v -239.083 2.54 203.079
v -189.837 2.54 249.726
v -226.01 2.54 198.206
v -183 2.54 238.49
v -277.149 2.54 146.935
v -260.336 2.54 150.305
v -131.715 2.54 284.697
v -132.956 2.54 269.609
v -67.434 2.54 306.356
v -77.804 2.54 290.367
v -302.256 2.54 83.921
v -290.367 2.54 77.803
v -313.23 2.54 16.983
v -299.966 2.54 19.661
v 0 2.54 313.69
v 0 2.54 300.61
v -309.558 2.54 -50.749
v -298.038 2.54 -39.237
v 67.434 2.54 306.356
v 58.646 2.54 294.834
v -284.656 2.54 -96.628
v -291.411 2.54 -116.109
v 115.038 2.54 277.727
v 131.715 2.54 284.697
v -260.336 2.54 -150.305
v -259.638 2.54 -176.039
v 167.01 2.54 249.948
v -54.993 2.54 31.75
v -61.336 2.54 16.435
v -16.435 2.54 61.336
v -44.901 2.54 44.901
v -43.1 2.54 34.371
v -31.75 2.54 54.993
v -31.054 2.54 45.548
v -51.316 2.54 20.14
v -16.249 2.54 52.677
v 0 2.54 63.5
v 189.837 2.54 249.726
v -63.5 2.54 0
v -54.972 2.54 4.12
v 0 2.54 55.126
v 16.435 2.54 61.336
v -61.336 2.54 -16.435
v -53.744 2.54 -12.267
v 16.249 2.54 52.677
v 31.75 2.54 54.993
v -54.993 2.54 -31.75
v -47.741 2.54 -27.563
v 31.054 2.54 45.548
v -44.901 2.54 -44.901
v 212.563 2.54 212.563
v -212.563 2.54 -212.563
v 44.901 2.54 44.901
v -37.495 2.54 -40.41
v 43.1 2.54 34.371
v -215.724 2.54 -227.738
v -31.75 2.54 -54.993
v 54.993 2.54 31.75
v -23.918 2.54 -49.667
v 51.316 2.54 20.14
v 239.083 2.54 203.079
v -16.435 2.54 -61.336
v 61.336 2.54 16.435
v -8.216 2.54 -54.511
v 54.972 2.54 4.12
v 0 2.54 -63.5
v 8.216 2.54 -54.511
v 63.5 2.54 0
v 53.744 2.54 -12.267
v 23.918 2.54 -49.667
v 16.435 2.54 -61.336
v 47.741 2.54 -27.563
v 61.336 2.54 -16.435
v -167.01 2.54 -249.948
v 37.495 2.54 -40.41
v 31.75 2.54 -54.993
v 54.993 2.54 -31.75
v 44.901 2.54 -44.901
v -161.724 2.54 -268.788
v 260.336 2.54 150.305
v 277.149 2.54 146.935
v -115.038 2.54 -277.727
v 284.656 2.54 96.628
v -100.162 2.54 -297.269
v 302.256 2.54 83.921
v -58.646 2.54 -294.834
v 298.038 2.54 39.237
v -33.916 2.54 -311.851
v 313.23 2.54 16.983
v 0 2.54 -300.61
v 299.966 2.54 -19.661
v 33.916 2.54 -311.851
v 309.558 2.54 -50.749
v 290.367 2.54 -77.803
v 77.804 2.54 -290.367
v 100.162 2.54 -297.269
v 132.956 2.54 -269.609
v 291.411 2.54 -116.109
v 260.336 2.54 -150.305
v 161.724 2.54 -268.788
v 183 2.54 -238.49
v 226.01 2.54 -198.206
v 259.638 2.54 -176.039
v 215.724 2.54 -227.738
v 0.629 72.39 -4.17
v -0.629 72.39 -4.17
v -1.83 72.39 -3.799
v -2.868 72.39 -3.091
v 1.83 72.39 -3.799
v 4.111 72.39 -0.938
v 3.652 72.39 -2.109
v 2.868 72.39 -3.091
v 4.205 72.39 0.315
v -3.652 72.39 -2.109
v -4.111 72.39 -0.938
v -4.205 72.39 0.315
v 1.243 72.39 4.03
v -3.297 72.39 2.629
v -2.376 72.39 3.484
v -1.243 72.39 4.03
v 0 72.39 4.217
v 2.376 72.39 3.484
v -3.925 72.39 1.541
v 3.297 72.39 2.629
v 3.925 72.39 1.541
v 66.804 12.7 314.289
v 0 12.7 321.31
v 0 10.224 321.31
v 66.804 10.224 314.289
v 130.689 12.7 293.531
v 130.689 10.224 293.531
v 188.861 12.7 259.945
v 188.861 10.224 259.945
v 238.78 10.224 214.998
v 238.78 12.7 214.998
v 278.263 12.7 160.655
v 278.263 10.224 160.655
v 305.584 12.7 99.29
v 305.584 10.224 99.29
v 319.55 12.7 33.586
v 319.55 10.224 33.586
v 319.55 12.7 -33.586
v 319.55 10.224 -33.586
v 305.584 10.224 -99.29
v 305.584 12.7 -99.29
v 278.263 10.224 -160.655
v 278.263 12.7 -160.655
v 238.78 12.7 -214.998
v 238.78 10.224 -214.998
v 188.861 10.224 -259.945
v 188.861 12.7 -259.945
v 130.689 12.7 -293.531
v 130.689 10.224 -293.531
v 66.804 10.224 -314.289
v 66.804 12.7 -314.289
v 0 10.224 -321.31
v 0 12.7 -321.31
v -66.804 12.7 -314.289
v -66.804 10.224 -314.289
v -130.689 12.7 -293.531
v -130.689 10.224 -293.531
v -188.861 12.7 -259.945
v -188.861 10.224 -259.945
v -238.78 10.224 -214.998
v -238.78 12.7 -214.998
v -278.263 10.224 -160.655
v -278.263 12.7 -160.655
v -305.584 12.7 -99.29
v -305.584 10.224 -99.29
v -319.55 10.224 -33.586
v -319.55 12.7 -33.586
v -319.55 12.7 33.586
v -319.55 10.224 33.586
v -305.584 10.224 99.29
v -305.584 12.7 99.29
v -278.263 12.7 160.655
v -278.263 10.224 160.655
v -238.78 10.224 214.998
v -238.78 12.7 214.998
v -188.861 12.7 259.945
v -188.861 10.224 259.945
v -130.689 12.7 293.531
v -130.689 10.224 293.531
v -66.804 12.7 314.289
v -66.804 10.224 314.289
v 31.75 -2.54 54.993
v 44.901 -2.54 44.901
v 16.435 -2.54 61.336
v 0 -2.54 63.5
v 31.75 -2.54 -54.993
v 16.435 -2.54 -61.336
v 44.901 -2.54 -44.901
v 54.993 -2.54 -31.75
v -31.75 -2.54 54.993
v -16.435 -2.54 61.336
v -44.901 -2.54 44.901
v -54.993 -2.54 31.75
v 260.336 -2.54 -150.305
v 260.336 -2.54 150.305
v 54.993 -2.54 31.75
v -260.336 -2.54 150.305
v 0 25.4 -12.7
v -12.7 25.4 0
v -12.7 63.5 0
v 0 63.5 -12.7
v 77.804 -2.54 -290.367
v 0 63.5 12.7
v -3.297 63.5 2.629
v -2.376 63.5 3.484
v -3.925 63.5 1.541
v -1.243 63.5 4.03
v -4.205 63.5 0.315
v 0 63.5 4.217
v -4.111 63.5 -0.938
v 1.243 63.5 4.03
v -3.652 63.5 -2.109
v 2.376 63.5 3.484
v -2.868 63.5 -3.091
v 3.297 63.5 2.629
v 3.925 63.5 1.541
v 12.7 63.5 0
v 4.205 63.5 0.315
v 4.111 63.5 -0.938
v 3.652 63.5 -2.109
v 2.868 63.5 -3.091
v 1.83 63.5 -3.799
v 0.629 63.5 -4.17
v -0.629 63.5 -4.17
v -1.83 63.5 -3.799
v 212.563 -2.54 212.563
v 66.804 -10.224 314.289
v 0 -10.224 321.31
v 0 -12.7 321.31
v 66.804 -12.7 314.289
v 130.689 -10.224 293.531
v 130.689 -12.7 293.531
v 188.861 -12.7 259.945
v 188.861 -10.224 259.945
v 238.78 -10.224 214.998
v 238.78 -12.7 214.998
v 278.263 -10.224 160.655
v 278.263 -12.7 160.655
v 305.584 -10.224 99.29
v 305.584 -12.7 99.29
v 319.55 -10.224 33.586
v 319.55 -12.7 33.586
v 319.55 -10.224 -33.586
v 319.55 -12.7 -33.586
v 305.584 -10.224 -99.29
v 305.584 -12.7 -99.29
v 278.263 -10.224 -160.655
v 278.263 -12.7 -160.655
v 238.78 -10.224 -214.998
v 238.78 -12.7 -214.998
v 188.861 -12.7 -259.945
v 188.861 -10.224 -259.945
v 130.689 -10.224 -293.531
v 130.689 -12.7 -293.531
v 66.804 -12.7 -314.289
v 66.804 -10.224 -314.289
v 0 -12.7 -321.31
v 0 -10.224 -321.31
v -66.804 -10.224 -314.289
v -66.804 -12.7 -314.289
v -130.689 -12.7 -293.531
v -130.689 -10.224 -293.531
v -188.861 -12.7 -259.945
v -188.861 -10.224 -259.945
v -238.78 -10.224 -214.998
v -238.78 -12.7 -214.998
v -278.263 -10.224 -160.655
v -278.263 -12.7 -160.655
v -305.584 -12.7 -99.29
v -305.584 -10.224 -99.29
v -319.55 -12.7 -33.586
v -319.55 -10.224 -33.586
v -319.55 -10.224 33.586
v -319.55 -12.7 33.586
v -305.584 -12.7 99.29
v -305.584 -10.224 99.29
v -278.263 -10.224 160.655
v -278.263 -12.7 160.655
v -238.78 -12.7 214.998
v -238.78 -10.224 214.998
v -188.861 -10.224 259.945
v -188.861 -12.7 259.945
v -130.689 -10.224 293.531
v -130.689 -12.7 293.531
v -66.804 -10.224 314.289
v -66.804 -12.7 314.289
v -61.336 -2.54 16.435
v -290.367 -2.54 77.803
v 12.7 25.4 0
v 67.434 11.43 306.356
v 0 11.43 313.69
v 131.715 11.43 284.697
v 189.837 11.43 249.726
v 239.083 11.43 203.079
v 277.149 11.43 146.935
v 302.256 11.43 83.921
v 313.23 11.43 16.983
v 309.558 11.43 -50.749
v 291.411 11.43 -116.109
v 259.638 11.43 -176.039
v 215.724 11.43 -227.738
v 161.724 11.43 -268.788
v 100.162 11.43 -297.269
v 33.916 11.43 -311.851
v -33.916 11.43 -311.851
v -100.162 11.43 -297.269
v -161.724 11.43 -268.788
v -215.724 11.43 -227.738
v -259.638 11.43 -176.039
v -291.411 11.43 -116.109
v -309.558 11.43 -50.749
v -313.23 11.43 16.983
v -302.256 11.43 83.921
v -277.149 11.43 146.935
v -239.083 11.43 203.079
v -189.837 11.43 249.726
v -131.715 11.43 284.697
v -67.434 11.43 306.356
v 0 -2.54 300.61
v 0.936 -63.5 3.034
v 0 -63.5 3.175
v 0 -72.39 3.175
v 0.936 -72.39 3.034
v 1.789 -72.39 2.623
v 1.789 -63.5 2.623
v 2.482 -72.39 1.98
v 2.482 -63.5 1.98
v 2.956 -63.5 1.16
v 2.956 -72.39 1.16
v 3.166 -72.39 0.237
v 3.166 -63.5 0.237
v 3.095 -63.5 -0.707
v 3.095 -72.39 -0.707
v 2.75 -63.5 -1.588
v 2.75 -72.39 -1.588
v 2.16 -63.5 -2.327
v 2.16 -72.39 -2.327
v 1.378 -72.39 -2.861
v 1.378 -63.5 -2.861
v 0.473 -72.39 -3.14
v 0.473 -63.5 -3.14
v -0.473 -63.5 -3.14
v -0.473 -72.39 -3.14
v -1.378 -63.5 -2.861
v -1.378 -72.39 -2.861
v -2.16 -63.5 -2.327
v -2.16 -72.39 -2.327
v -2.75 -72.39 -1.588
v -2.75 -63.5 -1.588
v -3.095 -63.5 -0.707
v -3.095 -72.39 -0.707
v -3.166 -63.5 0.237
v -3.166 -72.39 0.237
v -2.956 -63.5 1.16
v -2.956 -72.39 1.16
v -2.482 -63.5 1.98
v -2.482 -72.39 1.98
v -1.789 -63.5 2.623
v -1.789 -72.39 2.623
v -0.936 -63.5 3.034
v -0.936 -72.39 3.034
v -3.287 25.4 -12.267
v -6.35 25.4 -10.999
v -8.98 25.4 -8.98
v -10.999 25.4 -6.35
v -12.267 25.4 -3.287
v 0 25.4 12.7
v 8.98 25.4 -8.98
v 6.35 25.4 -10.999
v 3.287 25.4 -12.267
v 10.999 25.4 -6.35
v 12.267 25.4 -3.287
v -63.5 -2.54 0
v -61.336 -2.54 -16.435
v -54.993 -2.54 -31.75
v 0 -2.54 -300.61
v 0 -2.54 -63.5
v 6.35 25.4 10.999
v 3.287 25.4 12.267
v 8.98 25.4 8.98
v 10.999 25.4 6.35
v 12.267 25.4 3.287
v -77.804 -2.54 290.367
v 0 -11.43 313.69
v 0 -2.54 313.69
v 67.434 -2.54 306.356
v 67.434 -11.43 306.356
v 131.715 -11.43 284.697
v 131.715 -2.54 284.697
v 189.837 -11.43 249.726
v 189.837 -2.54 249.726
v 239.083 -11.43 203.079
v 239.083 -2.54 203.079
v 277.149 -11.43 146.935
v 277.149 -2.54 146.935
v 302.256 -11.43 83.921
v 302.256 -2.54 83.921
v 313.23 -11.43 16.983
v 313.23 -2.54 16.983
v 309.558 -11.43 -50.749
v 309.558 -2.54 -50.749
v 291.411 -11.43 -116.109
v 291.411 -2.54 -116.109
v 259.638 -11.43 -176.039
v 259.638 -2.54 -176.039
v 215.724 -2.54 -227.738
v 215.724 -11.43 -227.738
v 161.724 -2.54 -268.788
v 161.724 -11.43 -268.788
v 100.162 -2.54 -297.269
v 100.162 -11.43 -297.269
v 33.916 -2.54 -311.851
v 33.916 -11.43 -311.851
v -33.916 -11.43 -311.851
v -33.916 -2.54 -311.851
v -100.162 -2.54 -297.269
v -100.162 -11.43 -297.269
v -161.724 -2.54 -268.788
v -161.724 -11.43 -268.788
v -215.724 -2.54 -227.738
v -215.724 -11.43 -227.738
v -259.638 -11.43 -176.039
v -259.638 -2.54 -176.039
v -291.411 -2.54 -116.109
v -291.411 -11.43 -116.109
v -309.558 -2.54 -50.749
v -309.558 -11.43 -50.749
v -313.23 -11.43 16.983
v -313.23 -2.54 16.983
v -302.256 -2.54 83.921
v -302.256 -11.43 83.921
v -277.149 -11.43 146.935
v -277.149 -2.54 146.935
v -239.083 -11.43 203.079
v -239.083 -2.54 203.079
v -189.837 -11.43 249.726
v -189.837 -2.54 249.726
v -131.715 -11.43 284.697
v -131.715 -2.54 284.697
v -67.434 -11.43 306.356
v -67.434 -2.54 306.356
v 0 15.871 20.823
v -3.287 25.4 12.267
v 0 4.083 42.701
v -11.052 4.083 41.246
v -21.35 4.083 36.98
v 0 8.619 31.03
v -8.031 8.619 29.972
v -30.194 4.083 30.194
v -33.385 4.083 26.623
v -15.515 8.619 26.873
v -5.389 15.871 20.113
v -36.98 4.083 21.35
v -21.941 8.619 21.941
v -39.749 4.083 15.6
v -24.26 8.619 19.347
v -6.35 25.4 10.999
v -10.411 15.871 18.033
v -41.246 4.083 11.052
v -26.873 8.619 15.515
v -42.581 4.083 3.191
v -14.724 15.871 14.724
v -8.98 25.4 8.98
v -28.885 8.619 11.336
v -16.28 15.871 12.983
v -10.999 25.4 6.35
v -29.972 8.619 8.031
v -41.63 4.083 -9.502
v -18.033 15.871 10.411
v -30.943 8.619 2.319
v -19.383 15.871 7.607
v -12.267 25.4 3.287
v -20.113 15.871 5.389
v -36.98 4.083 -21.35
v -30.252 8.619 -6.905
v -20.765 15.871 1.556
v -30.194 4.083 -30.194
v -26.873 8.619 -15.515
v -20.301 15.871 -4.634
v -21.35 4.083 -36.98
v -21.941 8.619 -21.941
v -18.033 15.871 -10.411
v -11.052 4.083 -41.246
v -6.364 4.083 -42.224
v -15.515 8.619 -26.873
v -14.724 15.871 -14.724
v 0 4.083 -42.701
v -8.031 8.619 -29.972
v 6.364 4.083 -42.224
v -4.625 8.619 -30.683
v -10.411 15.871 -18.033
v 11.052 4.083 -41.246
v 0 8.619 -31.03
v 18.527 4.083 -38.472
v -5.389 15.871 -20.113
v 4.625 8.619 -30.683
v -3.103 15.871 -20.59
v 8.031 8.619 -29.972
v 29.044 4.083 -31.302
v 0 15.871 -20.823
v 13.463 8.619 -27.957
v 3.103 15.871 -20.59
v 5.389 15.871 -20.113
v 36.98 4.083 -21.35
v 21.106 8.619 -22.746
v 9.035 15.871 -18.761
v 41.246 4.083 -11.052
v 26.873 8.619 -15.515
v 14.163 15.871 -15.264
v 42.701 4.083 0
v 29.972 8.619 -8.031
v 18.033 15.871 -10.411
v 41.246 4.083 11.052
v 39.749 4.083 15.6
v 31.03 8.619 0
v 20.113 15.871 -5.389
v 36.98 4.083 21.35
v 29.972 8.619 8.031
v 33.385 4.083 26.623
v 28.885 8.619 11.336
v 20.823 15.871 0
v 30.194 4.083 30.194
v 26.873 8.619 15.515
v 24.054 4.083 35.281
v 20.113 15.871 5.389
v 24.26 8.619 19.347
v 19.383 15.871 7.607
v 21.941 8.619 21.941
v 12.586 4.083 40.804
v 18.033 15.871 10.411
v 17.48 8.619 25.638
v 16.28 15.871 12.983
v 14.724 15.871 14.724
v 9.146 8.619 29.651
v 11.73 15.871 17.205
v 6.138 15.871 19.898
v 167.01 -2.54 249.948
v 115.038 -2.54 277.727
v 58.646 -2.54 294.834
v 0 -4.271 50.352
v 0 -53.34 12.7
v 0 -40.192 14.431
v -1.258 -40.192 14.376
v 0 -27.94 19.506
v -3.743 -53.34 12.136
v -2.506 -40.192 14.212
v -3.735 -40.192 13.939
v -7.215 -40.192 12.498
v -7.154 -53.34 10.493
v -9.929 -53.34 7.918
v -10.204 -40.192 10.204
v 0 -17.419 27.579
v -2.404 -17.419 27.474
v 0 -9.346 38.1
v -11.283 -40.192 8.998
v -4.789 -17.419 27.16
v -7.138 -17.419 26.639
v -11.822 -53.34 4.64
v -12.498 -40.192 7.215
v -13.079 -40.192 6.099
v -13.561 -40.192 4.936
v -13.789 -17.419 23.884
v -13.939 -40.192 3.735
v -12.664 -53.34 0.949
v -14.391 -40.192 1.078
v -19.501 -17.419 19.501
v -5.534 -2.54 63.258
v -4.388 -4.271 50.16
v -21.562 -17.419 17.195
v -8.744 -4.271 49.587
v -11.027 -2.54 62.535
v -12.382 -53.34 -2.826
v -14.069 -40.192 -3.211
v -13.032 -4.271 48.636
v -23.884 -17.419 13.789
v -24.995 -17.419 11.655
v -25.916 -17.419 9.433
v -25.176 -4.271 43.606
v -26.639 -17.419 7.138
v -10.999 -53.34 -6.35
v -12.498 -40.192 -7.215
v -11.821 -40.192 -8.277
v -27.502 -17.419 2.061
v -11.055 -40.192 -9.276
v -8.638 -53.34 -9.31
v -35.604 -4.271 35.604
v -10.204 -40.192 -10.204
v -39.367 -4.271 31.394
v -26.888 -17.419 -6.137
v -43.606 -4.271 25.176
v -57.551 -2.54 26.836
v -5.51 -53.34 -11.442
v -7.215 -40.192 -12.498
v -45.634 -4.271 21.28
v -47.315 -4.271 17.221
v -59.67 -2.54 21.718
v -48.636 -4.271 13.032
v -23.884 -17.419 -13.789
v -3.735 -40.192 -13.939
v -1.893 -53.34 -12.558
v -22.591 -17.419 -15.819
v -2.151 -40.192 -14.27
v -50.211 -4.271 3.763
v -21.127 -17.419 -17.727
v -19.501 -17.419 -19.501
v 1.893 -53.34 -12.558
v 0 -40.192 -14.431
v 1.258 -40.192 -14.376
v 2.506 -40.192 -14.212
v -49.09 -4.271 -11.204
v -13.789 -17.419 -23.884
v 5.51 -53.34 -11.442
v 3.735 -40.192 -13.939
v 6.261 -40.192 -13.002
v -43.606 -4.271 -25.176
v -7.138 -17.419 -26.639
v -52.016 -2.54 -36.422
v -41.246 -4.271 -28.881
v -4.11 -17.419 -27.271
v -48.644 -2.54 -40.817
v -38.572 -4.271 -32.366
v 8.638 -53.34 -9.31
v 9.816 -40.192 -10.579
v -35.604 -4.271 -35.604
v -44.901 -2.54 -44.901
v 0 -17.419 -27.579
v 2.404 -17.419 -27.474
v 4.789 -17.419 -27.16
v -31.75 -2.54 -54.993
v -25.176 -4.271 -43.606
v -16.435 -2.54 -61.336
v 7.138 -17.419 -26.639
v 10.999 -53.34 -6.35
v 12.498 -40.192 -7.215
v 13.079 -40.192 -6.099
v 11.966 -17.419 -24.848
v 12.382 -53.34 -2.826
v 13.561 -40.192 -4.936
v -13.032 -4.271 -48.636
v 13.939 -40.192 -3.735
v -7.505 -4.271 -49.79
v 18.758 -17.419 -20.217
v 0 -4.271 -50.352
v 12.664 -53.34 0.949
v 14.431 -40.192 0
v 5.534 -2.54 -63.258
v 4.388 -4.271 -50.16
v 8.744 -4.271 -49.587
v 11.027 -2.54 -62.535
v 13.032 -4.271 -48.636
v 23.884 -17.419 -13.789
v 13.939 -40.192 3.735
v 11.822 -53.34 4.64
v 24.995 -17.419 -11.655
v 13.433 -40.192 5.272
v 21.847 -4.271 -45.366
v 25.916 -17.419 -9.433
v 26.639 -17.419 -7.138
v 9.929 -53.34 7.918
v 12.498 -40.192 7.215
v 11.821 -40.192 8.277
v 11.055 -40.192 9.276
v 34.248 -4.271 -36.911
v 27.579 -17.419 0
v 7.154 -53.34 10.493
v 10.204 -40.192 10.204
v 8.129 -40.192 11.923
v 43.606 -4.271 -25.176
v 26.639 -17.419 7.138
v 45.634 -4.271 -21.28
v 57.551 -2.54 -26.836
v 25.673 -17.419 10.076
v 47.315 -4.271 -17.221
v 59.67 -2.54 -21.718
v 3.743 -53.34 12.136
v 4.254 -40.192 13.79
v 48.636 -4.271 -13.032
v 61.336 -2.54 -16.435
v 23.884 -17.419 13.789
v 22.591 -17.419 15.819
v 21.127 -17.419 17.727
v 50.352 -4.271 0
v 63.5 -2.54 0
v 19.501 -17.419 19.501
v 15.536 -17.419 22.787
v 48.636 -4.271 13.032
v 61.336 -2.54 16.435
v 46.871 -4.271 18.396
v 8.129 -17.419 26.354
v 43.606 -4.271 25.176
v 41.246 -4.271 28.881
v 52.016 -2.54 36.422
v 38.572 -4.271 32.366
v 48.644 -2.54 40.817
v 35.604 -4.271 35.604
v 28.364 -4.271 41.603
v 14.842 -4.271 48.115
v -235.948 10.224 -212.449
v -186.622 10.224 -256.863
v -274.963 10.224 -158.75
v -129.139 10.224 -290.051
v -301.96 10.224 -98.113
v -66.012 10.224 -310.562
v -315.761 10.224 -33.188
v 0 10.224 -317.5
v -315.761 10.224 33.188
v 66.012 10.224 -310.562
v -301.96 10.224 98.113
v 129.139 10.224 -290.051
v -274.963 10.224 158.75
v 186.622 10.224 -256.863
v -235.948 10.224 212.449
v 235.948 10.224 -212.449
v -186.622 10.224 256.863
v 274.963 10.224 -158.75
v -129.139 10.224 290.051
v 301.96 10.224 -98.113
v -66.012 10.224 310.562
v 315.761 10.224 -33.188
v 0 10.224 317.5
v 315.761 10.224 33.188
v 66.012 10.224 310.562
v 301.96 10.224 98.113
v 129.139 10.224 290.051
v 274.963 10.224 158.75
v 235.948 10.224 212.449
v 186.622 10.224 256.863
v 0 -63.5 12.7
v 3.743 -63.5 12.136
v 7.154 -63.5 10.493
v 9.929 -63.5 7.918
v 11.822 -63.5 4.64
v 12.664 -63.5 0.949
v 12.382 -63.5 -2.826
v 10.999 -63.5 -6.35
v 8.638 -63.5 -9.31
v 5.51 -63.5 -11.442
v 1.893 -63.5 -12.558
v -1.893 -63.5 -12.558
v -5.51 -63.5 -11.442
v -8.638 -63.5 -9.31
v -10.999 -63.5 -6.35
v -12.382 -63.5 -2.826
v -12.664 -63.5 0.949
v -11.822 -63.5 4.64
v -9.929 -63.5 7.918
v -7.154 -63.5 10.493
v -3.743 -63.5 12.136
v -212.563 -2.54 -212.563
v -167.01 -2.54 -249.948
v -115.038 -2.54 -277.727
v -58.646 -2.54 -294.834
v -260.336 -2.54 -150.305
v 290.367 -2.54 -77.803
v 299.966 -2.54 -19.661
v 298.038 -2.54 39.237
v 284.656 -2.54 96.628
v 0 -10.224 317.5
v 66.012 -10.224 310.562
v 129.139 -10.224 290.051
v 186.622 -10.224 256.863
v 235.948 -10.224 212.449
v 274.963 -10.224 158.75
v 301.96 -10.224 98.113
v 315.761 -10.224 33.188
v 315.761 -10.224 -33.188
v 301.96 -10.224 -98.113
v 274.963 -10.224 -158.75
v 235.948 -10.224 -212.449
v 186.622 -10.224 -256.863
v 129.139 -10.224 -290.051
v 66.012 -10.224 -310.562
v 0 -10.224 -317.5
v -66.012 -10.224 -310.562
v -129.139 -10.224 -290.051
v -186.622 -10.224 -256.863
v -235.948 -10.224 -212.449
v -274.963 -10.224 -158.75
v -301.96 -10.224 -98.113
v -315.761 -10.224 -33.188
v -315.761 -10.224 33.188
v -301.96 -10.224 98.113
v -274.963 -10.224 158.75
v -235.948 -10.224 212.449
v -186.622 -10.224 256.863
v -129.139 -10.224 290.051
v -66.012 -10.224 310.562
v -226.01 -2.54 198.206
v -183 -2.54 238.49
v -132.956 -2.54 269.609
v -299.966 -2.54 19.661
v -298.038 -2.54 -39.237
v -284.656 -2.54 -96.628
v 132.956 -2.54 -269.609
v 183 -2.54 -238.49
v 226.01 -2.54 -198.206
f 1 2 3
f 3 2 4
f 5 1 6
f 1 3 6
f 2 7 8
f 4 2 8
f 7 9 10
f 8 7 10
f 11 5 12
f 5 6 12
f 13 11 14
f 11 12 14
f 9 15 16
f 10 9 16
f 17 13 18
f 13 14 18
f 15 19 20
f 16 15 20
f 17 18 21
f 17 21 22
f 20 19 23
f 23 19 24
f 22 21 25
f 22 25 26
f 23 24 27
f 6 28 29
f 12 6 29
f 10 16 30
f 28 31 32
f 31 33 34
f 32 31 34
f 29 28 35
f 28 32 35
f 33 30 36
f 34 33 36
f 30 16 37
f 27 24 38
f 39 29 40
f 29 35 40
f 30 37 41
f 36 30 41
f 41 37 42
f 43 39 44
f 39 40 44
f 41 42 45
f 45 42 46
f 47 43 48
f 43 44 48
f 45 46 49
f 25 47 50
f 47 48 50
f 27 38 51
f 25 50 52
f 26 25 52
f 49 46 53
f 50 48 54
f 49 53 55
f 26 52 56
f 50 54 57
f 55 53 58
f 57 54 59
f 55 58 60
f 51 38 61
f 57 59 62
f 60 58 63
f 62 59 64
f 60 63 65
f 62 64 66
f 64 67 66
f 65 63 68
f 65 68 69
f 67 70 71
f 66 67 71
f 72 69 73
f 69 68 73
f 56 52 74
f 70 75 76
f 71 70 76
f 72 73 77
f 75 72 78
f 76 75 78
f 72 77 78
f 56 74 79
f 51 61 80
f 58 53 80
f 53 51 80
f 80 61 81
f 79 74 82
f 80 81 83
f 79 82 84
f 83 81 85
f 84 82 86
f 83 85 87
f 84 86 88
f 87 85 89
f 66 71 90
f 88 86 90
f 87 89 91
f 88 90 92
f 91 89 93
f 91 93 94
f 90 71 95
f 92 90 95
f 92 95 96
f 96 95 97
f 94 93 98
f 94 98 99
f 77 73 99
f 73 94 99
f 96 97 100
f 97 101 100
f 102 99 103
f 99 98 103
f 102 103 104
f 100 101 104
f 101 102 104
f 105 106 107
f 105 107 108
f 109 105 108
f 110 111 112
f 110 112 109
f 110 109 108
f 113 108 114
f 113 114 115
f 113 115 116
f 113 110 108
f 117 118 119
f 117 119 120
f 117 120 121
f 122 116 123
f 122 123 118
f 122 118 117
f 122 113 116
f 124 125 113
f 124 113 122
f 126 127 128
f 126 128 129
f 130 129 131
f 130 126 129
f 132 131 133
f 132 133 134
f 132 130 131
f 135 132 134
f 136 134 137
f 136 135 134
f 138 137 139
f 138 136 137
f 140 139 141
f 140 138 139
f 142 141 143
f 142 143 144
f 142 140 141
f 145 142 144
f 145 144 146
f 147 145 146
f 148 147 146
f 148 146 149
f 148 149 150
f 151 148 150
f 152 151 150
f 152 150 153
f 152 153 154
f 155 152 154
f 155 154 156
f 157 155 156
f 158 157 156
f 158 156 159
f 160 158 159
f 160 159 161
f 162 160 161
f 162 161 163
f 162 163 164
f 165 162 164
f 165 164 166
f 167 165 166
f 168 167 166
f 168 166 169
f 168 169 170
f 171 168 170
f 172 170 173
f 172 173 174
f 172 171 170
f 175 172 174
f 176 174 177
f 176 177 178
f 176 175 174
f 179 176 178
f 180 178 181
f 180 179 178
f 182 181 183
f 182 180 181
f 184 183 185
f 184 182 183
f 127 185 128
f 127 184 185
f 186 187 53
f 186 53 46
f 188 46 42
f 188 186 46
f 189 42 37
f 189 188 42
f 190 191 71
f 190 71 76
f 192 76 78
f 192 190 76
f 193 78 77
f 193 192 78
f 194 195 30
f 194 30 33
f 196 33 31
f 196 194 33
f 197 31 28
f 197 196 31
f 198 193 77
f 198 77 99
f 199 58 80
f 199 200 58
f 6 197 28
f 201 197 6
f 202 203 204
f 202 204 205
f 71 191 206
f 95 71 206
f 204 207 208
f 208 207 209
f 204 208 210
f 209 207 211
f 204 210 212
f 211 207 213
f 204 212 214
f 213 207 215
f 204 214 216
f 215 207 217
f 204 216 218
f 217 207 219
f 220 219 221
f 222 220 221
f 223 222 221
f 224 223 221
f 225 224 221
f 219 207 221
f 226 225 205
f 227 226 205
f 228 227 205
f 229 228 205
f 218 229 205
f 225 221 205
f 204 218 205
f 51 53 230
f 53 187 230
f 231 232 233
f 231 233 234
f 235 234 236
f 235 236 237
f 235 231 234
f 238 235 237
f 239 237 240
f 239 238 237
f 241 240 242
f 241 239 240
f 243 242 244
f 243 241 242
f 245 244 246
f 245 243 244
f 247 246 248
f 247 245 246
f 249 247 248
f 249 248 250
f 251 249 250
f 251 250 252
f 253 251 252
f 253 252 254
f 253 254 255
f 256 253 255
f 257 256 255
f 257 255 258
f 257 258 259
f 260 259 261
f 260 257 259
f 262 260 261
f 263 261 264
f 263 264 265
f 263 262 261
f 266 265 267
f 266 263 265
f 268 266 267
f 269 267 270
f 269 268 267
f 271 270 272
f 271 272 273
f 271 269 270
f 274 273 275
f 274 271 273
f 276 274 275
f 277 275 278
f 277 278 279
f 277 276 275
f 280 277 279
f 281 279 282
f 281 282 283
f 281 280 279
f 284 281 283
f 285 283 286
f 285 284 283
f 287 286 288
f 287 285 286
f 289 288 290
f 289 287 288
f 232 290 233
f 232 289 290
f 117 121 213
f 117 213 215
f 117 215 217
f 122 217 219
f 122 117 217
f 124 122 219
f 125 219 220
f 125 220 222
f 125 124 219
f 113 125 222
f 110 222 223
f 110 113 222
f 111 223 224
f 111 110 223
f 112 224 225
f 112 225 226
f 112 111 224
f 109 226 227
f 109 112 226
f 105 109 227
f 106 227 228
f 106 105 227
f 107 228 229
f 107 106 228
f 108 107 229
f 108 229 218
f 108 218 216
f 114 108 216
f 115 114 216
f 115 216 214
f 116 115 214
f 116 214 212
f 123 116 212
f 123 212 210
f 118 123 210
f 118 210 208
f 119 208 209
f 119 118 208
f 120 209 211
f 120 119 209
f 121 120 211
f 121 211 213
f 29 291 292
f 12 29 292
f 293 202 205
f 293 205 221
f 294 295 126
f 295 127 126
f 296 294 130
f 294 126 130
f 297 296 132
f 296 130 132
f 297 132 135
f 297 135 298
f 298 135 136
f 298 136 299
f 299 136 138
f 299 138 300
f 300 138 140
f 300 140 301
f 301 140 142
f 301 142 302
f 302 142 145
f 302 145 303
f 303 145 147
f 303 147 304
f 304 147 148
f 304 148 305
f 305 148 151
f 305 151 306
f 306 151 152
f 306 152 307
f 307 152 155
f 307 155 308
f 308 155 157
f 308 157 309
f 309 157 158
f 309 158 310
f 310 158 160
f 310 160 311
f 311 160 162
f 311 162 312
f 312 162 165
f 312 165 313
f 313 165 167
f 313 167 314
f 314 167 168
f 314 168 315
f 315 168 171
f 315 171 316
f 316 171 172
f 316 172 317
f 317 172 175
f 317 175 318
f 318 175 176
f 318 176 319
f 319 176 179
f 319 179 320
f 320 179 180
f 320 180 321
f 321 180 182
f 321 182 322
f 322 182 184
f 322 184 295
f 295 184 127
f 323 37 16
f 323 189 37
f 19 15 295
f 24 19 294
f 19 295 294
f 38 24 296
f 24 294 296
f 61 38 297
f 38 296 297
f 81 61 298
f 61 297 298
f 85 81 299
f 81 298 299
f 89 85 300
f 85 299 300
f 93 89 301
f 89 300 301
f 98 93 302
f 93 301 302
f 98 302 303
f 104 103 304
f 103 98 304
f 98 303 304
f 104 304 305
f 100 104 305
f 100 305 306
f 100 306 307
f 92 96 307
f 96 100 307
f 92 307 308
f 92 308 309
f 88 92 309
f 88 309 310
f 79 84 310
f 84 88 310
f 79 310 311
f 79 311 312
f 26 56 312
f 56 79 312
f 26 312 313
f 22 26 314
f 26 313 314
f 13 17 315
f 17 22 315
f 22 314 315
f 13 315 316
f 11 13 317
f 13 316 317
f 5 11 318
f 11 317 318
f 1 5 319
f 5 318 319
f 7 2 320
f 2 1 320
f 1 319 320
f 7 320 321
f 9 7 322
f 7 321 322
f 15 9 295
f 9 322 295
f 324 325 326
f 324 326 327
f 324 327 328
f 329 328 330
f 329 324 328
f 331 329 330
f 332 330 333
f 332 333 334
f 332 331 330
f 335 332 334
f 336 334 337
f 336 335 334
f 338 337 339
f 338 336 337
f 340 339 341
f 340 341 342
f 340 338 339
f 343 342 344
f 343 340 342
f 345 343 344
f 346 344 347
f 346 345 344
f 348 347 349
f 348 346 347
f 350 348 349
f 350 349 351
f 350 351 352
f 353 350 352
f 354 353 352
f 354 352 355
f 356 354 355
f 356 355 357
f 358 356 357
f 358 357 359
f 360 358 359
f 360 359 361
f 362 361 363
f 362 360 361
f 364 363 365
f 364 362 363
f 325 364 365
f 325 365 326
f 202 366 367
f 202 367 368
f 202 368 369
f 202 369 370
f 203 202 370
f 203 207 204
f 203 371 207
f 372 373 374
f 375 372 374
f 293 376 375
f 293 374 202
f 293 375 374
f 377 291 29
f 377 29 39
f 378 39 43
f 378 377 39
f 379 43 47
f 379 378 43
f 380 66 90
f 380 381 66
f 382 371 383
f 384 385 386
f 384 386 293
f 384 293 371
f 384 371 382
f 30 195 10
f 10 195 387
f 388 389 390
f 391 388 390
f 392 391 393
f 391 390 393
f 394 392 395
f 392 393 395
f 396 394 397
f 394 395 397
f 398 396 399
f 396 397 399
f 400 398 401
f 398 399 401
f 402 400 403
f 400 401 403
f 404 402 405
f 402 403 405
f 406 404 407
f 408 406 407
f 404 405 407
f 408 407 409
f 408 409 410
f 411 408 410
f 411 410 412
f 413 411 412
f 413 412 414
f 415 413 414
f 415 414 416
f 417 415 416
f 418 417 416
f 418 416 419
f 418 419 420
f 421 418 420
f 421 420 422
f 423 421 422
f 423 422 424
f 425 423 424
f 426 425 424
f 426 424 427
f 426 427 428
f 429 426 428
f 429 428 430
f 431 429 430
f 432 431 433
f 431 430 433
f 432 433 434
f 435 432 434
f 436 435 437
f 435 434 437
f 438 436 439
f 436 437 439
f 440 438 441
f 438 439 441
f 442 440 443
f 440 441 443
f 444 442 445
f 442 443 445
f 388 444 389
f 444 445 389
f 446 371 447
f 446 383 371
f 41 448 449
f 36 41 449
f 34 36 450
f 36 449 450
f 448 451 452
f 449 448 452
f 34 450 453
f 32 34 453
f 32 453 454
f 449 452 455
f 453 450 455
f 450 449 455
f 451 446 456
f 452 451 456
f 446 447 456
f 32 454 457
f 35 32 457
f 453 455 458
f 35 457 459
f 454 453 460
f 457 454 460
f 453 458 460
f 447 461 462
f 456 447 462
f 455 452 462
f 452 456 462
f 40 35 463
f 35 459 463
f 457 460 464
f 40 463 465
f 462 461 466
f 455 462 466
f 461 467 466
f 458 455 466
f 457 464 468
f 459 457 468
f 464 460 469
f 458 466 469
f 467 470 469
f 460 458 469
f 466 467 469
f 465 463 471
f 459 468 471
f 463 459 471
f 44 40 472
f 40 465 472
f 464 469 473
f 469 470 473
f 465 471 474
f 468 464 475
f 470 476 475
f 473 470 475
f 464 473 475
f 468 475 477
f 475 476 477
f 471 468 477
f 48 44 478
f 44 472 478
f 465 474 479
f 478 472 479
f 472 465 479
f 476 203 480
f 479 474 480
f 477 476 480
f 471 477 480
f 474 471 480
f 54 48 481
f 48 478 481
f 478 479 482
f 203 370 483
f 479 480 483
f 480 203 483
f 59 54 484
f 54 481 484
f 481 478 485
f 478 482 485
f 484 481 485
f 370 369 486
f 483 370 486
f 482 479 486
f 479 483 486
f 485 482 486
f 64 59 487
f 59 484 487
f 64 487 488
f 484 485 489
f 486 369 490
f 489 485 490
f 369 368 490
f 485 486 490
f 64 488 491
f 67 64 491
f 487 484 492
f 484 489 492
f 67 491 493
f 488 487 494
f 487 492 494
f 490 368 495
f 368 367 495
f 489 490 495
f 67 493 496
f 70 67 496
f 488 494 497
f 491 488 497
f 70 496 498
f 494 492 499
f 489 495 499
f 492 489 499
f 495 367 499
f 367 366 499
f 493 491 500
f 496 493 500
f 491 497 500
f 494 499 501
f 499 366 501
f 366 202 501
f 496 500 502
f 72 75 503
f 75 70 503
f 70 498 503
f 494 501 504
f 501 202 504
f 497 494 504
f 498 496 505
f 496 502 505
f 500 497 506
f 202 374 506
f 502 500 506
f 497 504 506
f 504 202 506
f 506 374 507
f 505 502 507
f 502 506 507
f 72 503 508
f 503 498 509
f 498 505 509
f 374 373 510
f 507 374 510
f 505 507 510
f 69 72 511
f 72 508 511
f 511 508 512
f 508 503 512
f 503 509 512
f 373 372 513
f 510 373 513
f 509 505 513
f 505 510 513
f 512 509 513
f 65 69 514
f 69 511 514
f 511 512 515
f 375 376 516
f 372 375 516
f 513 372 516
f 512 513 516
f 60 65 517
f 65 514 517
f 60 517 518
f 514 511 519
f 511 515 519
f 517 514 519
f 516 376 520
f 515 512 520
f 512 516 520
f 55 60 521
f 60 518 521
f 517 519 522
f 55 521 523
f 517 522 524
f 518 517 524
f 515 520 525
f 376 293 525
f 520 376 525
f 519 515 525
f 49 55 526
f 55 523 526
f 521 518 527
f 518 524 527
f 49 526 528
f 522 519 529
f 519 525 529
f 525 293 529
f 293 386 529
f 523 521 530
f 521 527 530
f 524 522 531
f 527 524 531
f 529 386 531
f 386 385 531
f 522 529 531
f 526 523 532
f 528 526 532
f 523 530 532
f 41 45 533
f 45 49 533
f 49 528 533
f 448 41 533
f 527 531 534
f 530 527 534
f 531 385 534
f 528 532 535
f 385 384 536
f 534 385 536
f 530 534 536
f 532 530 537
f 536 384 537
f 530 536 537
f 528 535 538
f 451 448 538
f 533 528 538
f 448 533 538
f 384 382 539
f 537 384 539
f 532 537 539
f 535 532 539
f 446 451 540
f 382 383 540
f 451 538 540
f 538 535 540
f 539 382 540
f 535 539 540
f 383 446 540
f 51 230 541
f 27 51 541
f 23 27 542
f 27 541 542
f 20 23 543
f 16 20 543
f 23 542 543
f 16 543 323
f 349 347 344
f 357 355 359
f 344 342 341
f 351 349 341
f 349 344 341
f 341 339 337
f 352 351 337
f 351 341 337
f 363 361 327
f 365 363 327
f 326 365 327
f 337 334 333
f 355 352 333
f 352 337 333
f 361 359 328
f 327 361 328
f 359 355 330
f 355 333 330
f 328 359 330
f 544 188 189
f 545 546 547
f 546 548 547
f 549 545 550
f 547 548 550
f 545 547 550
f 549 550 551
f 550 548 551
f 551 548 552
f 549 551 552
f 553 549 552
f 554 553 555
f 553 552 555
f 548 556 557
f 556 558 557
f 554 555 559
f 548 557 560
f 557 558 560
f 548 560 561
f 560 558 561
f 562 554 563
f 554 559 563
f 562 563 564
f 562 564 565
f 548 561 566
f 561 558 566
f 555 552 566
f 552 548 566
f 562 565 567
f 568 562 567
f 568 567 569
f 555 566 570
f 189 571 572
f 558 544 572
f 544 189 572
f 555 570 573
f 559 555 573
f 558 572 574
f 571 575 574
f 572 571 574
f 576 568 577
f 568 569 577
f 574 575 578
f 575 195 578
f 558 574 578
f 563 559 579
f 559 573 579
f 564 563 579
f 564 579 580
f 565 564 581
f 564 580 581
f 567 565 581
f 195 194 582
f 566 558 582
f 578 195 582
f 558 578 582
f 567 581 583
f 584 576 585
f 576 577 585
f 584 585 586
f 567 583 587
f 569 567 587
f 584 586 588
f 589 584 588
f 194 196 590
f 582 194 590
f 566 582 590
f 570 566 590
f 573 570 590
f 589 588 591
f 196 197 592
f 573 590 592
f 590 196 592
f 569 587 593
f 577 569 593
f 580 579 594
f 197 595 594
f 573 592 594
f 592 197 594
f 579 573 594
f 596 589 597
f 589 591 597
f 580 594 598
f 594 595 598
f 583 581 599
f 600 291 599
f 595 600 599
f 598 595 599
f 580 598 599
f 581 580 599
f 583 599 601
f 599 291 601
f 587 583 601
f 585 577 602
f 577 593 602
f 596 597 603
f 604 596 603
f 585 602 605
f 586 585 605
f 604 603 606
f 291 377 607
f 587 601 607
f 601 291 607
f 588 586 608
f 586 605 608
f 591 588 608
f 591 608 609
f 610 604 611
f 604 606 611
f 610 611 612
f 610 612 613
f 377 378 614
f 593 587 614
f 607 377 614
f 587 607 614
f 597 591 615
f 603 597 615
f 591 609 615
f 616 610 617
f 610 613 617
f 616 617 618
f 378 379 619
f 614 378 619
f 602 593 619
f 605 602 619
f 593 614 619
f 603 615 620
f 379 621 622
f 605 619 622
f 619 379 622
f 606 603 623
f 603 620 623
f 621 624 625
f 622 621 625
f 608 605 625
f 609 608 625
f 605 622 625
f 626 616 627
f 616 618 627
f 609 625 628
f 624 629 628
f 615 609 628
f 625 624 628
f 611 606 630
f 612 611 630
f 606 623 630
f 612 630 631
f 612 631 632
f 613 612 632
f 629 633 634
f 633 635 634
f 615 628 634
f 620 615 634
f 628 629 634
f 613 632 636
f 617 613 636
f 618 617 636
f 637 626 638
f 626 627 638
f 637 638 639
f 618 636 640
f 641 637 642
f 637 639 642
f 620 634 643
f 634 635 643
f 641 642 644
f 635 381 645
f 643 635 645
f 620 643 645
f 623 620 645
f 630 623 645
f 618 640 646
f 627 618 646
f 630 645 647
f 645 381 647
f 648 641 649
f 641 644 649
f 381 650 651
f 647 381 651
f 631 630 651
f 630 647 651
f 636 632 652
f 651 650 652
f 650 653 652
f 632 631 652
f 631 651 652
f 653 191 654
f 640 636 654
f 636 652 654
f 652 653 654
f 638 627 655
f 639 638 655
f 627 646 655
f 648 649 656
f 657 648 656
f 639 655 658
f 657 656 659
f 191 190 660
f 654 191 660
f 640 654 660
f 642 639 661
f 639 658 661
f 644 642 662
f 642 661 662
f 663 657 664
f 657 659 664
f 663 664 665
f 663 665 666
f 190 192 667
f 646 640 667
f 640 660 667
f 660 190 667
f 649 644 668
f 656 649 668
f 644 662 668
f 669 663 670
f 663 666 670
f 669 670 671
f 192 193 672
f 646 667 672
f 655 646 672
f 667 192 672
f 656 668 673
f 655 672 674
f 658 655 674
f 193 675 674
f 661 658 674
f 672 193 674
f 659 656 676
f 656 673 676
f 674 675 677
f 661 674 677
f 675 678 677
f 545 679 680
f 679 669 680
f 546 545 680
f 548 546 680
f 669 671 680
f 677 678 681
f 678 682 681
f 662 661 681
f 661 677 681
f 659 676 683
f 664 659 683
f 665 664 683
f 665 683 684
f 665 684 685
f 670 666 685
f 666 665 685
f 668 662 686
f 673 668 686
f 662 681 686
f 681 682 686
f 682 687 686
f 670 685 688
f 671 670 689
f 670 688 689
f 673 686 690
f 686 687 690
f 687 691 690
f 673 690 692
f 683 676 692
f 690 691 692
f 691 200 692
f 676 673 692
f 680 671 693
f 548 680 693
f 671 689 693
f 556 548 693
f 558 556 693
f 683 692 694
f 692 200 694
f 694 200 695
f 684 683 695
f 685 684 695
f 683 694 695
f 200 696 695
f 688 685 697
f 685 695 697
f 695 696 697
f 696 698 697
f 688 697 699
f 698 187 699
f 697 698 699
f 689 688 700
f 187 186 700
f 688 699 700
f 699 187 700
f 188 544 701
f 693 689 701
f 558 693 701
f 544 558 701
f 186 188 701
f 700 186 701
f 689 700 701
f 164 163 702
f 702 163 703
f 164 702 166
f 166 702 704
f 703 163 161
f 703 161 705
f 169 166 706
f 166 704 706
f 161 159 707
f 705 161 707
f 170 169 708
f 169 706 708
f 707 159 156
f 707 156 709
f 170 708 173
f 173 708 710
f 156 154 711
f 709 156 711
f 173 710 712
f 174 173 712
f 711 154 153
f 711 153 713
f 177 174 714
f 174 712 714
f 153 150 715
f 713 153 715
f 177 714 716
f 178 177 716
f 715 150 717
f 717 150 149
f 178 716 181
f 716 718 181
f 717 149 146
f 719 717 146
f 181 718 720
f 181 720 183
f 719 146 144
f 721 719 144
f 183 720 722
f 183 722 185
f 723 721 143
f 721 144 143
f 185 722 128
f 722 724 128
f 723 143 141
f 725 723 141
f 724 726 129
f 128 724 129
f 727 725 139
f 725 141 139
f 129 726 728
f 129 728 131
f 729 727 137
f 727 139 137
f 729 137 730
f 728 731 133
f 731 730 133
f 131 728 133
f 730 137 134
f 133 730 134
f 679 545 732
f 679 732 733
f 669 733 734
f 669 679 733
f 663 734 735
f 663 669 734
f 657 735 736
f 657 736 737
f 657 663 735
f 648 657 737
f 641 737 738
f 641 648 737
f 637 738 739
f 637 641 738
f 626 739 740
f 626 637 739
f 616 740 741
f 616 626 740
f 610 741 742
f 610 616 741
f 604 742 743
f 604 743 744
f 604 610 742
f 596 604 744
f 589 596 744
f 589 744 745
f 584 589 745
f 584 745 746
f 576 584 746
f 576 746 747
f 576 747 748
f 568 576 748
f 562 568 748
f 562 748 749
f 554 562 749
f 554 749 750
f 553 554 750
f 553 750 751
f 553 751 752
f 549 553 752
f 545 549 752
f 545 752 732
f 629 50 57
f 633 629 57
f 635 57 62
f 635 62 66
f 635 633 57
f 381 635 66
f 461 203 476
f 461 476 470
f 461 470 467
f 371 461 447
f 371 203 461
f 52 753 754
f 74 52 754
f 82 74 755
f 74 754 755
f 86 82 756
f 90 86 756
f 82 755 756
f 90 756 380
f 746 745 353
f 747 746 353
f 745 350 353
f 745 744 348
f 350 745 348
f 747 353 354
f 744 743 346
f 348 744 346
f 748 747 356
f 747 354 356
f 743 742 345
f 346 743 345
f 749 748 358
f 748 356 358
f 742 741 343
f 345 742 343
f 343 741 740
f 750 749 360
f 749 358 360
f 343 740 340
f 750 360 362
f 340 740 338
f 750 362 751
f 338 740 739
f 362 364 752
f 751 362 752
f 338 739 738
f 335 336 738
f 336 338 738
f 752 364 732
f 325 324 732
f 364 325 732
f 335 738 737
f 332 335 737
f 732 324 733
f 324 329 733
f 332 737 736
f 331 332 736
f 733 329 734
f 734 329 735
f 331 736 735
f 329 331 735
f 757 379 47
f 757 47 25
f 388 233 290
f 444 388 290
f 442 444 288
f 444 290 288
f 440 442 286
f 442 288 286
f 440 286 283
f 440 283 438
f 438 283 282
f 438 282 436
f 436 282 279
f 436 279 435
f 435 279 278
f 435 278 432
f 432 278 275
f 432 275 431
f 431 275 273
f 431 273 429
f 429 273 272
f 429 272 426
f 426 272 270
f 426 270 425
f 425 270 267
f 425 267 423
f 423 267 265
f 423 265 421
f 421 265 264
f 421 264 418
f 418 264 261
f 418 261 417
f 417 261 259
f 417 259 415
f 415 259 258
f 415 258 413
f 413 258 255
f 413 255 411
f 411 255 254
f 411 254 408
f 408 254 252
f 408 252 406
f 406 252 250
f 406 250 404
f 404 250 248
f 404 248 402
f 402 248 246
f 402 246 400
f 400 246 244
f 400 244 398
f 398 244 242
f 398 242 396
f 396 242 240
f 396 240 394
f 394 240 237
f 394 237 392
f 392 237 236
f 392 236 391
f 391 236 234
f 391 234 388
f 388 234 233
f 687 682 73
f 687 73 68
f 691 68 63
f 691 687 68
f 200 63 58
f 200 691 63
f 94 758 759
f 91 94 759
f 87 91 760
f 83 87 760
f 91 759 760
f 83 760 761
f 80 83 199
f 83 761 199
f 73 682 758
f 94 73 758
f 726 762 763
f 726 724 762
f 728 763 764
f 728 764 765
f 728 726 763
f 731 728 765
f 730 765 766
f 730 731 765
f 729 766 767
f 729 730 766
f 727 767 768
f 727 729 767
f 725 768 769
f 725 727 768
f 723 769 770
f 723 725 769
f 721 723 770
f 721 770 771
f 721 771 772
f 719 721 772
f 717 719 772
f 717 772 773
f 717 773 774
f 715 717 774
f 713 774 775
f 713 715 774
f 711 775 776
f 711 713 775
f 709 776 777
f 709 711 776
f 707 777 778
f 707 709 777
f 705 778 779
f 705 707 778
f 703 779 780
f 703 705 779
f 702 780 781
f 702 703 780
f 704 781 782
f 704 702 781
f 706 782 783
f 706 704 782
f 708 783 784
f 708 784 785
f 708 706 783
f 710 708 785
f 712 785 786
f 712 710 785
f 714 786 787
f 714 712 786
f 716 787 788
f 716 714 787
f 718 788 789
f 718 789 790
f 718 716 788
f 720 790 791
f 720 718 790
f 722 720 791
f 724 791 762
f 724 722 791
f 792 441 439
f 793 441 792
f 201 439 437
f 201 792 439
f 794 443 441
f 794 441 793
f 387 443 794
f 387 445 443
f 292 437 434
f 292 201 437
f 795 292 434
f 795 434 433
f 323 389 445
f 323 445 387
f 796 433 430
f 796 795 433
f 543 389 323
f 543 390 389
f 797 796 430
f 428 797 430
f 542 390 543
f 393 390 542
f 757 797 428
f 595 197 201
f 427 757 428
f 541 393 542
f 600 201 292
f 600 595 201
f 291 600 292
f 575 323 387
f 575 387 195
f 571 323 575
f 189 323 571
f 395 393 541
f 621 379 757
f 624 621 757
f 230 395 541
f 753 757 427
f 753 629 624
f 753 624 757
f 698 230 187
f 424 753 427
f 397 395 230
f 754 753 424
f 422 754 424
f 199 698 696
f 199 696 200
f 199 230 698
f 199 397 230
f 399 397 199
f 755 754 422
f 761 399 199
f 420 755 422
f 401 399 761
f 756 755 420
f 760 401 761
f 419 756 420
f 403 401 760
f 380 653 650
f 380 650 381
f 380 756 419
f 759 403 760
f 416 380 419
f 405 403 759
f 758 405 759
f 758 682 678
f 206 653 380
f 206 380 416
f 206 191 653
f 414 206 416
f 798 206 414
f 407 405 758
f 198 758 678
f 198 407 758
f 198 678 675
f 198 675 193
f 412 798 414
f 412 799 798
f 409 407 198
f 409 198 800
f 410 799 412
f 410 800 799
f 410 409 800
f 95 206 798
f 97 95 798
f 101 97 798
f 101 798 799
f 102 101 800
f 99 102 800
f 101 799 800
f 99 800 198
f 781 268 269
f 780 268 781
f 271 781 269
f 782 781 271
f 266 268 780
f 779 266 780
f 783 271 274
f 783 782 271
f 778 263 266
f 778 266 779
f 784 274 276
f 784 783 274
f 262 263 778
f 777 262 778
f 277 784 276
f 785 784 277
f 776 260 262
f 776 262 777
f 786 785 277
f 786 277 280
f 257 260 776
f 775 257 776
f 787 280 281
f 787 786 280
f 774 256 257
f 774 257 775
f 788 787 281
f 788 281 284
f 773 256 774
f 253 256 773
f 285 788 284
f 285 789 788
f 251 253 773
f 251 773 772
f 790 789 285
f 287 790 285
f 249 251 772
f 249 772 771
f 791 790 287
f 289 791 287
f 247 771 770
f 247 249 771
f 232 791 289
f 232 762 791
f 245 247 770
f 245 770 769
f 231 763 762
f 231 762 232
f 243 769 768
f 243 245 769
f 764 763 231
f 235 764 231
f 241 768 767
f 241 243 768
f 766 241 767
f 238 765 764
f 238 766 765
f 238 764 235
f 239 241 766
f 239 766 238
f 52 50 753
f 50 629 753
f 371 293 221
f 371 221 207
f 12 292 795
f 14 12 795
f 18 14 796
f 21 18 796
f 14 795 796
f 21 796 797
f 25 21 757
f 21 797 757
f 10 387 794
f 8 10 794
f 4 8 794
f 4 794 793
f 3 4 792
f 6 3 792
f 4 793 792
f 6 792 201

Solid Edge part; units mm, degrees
sketch "Sketch1" plane through (0, 0, 0) normal (1, 0, 0) x (0, 1, 0)
  line L0 (-72.39, 0) -> (-72.39, 3.175)
  line L1 (-72.39, 3.175) -> (-63.5, 3.175)
  line L2 (-63.5, 3.175) -> (-63.5, 12.7)
  line L3 (-63.5, 12.7) -> (25.4, 12.7)
  line L4 (25.4, 12.7) -> (25.4, 4.217)
  line L5 (25.4, 4.217) -> (72.39, 4.217)
  line L6 (72.39, 4.217) -> (72.39, 0)
  line L7 (-72.39, 0) -> (72.39, 0)
  dimension "D1" = 144.78
  dimension "D2" = 72.39
  dimension "D3" = 3.175
  dimension "D4" = 12.7
  dimension "D5" = 63.5
  dimension "D6" = 88.9
revolve "RevolvedProtrusion1" add sketch "Sketch1" angle 360 about axis through (0, -60.0075, 0) along (0, 1, 0)
sketch "Sketch2" plane through (0, 0, 0) normal (1, 0, 0) x (0, 1, 0)
  line L0 (-11.43, 313.69) -> (11.43, 313.69)
  line L1 (11.43, 313.69) -> (12.7, 321.31)
  line L2 (10.2235, 321.31) -> (12.7, 321.31)
  line L3 (10.2235, 317.5) -> (10.2235, 321.31)
  line L4 (-10.2235, 317.5) -> (10.2235, 317.5)
  line L5 (-10.2235, 321.31) -> (-10.2235, 317.5)
  line L6 (-12.7, 321.31) -> (-10.2235, 321.31)
  line L7 (-11.43, 313.69) -> (-12.7, 321.31)
  dimension "D1" = 313.69
  dimension "D2" = 3.81
  dimension "D3" = 7.62
  dimension "D4" = 20.447
  dimension "D5" = 25.4
  dimension "D6" = 22.86
revolve "RevolvedProtrusion2" add sketch "Sketch2" angle 360 about axis through (0, -60.0075, 0) along (0, 1, 0)
sketch "Sketch3" plane through (0, 0, 0) normal (0, -1, 0) x (1, 0, 0)
  circle A0 centre (0, 0) radius 313.69
extrude "Protrusion1" add sketch "Sketch3" along normal mid plane 5.08
fillet "Round_1" radius 50.8 2 edges at (0, -2.54, -12.7) (0, 2.54, -12.7)
sketch "Sketch4" plane through (0, -2.54, 0) normal (0, -1, 0) x (1, 0, 0)
  arc A0 (-77.8035, 290.3666) -> (-260.3356, 150.3048) centre (0, 0) ccw
  line L0 (-54.9926, 31.75) -> (-260.3356, 150.3048)
  arc A1 (-16.435, 61.3363) -> (-54.9926, 31.75) centre (0, 0) ccw
  line L1 (-16.435, 61.3363) -> (-77.8035, 290.3666)
extrude "Cutout1" cut sketch "Sketch4" against normal through all
pattern_circular "Pattern1" count 6 over 360 about axis through (0, -2.54, 0) along (0, -1, 0) of "Cutout1"
sketch "Sketch5" plane through (0, 0, 0) normal (0, -1, 0) x (1, 0, 0)
  line L0 (0, 12.7) -> (-12.7, 0)
  line L1 (-12.7, 0) -> (0, -12.7)
  line L2 (0, -12.7) -> (12.7, 0)
  line L3 (12.7, 0) -> (0, 12.7)
extrude "ExtrudedProtrusion_2" add sketch "Sketch5" against normal blind 63.5
properties part number "8-7" material "Carbon Fiber"
